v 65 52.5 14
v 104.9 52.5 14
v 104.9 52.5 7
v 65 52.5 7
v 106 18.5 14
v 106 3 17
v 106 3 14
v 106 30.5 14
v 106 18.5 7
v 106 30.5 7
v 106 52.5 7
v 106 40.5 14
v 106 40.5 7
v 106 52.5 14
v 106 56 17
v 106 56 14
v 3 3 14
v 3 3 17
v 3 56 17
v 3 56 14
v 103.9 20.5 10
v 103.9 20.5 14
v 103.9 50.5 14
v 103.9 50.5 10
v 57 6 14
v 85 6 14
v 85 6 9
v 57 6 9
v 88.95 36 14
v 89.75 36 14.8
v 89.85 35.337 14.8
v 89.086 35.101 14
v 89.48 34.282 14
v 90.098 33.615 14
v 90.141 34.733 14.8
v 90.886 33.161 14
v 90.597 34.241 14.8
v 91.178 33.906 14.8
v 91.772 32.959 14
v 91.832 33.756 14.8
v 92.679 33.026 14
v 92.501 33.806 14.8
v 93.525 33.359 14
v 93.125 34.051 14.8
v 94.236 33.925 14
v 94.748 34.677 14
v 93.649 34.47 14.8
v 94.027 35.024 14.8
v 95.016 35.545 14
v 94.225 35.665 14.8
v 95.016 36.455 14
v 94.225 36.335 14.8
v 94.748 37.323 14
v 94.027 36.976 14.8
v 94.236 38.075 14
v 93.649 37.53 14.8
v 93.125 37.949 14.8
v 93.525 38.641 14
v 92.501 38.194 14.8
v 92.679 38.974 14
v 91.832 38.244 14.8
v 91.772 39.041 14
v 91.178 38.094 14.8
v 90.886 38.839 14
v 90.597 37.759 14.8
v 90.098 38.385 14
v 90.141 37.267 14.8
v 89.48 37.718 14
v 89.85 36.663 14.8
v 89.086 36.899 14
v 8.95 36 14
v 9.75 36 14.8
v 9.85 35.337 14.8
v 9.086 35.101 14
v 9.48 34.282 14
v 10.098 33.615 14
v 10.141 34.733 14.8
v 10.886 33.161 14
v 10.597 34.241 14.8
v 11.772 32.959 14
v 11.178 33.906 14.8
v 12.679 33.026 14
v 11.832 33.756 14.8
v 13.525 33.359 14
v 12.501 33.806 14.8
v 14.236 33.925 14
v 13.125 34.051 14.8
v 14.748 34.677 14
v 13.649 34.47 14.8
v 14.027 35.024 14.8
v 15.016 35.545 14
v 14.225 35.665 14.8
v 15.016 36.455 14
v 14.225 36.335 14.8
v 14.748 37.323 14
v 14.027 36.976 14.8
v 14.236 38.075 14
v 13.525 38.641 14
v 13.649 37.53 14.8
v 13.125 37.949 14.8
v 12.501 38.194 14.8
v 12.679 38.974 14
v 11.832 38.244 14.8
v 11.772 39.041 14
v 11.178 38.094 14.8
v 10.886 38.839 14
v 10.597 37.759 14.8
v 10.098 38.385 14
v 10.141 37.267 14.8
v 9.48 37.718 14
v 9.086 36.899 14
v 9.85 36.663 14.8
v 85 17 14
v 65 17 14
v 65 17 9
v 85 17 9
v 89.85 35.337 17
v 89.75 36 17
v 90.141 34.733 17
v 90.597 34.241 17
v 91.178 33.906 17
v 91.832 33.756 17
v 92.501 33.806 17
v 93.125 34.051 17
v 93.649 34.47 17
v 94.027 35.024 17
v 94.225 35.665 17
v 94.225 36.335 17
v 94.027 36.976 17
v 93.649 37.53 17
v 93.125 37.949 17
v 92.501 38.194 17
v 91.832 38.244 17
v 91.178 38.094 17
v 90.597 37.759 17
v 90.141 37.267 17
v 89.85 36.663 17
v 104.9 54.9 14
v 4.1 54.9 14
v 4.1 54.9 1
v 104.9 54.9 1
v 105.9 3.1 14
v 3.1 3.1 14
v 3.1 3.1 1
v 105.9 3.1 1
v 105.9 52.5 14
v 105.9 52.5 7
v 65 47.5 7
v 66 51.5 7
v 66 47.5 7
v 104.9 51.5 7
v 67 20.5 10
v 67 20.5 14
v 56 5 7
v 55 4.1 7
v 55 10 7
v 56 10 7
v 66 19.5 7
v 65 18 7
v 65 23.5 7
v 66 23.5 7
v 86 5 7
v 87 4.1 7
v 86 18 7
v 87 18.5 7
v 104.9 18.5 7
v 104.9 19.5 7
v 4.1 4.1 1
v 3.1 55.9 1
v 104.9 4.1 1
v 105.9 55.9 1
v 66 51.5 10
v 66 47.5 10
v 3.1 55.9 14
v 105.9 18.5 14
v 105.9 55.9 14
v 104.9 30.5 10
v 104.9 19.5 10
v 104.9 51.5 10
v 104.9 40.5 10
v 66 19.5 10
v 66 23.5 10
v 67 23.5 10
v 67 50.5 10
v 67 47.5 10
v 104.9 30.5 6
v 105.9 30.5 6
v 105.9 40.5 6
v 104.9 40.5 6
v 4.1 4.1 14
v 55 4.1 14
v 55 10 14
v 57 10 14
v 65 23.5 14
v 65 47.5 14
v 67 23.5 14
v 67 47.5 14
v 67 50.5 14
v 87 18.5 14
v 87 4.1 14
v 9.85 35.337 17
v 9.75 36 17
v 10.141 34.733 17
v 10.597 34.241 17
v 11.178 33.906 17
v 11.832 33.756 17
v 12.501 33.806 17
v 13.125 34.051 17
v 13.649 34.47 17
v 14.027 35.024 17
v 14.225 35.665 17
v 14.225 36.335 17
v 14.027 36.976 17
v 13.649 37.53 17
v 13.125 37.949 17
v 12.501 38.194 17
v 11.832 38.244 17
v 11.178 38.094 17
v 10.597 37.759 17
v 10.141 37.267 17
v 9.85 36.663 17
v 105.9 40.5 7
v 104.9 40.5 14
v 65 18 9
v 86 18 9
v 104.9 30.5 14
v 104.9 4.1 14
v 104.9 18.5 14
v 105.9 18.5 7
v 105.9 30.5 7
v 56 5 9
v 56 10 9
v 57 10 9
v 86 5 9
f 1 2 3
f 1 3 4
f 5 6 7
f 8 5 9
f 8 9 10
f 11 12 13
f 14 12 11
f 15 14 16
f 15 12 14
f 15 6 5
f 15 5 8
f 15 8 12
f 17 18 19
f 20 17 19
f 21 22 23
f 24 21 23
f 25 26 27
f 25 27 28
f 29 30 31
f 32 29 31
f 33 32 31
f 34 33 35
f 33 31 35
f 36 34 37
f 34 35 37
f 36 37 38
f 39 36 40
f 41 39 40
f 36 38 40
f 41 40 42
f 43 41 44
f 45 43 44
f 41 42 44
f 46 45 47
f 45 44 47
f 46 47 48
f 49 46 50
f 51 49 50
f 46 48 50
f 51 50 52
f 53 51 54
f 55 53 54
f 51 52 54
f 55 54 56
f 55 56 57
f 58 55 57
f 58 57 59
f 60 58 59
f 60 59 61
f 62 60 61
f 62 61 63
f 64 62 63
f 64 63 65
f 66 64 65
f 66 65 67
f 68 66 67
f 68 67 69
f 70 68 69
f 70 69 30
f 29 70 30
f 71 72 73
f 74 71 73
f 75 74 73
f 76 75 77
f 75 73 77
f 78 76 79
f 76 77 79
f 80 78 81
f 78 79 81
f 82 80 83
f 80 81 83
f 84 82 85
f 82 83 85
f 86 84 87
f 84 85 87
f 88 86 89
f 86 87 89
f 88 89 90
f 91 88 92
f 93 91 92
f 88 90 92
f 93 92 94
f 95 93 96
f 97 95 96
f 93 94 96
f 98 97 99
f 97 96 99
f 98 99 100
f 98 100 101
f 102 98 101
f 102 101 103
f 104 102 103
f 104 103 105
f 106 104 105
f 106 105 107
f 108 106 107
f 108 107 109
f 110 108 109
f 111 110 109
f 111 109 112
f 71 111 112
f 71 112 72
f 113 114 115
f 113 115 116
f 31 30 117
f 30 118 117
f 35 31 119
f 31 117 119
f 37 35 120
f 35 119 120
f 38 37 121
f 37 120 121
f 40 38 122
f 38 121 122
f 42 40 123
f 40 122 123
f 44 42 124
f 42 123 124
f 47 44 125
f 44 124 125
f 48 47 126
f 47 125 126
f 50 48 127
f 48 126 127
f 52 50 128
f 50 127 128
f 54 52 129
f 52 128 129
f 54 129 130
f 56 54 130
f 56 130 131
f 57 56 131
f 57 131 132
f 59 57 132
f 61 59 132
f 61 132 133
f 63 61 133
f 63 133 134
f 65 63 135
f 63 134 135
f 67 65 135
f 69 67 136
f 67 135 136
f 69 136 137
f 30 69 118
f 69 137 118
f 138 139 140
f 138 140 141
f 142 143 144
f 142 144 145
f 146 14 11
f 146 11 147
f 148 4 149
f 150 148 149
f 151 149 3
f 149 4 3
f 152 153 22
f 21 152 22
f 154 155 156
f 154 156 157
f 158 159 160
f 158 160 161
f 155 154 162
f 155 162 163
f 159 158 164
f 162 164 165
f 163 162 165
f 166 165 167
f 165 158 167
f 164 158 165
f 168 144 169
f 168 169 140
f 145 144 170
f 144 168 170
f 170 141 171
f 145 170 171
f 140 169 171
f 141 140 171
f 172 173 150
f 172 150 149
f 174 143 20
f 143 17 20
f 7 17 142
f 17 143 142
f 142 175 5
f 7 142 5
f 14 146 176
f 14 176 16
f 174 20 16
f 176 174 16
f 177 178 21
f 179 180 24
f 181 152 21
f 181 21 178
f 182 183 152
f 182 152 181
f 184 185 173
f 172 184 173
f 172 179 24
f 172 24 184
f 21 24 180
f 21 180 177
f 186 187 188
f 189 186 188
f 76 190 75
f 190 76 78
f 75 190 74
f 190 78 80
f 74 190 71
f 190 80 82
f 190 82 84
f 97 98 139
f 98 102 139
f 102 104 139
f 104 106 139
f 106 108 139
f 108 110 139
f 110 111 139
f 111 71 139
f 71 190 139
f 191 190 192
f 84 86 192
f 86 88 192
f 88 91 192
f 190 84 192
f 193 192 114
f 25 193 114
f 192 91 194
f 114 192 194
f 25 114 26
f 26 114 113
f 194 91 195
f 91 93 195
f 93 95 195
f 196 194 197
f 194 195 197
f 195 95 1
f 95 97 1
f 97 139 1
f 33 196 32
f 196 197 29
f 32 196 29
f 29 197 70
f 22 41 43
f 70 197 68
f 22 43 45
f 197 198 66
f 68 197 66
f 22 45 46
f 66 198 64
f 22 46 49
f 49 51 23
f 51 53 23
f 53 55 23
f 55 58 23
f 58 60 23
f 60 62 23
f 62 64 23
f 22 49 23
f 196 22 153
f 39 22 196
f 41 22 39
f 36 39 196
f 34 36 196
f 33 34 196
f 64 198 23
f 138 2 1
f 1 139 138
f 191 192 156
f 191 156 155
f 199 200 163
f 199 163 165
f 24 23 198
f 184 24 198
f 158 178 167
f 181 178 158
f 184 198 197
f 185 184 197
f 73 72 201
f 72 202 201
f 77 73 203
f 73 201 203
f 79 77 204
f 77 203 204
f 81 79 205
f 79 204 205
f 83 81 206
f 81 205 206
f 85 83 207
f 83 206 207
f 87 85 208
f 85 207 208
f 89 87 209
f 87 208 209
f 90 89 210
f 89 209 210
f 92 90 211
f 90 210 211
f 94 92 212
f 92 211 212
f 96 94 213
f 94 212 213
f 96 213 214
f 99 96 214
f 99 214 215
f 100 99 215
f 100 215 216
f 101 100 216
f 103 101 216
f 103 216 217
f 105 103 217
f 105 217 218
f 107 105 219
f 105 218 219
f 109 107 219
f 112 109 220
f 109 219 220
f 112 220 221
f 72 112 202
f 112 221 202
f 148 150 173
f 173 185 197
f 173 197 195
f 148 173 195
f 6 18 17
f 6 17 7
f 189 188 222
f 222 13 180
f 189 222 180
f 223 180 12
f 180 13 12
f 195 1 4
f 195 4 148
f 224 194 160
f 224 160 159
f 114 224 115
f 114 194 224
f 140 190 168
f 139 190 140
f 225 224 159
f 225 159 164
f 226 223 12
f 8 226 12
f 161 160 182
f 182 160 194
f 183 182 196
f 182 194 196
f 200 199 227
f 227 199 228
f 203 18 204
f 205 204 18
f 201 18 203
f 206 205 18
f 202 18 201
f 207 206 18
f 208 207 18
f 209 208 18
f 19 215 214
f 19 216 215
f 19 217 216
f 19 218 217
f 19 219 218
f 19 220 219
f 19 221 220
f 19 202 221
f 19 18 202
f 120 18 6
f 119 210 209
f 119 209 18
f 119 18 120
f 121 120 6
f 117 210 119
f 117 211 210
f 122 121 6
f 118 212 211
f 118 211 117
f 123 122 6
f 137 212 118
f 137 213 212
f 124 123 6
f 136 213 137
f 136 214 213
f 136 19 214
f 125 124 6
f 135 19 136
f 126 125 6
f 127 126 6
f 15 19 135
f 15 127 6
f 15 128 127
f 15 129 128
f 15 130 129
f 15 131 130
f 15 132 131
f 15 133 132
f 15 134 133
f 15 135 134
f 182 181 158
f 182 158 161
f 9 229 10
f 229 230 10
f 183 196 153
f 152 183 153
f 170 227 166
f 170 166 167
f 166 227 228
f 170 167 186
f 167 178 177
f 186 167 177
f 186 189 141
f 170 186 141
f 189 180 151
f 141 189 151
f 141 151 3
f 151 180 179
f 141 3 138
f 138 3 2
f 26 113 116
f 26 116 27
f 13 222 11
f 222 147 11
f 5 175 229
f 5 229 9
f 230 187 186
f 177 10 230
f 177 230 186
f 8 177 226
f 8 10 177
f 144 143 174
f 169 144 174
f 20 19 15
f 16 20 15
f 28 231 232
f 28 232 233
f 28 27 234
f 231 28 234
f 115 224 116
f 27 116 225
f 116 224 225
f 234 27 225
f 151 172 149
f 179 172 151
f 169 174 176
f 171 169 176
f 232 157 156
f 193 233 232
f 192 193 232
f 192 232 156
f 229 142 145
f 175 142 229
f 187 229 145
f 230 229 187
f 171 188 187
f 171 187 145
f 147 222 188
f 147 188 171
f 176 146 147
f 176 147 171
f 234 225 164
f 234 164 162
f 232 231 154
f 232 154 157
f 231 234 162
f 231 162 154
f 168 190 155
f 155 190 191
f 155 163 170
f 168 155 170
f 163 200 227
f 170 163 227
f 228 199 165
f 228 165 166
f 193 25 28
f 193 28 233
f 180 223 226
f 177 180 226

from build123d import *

# Parameters (mm, degrees)
SKETCH022_W         = 103
SKETCH022_H         = 53
PAD014_DEPTH        = 3
HOLE002_D           = 4.5
HOLE002_DEPTH       = 25
HOLE002_CSINK_D     = 6.1
HOLE002_CSINK_ANGLE = 90
PAD015_DEPTH        = 7
SKETCH025_W         = 102.8
SKETCH025_H         = 52.8
SKETCH025_W_2       = 100.8
SKETCH025_H_2       = 50.8
PAD016_DEPTH        = 13
PAD017_DEPTH        = 7
SKETCH026_W         = 10
SKETCH026_H         = 8
POCKET003_DEPTH     = 5
PAD027_DEPTH        = 5
PAD028_DEPTH        = 4


with BuildPart() as part:
    # Sketch022 → Pad014 (new body)
    with BuildSketch(Plane.XY):
        with Locations((51.5, 26.5)):
            Rectangle(SKETCH022_W, SKETCH022_H)
    extrude(amount=-PAD014_DEPTH)

    # Hole002
    with Locations(Plane(origin=(0, 0, -3), x_dir=(1, 0, 0), z_dir=(0, 0, -1))):
        with Locations((9, -33), (89, -33)):
            CounterSinkHole(HOLE002_D / 2, HOLE002_CSINK_D / 2, depth=HOLE002_DEPTH, counter_sink_angle=HOLE002_CSINK_ANGLE)

    # Sketch024 → Pad015 (join)
    with BuildSketch(Plane.XY.offset(-3)):
        Polygon((103, 49.5), (62, 49.5), (62, 44.5), (63, 44.5), (63, 48.5), (102, 48.5), (102, 16.5), (63, 16.5), (63, 20.5), (62, 20.5), (62, 15.5), (103, 15.5), align=None)
    extrude(amount=-PAD015_DEPTH)

    # Sketch025 → Pad016 (join)
    with BuildSketch(Plane.XY.offset(-3)):
        with Locations((51.5, 26.5)):
            Rectangle(SKETCH025_W, SKETCH025_H)
        with Locations((51.5, 26.5)):
            Rectangle(SKETCH025_W_2, SKETCH025_H_2, mode=Mode.SUBTRACT)
    extrude(amount=-PAD016_DEPTH)

    # Sketch027 → Pad017 (join)
    with BuildSketch(Plane.XY.offset(-3)):
        Polygon((52, 1), (84, 1), (84, 16.5), (62, 16.5), (62, 15), (83, 15), (83, 2), (53, 2), (53, 7), (52, 7), align=None)
    extrude(amount=-PAD017_DEPTH)

    # Sketch026 (on Face7 of Pad017) → Pocket003 (cut)
    with BuildSketch(Plane.YZ.offset(103)):
        with Locations((32.5, -7)):
            Rectangle(SKETCH026_W, SKETCH026_H)
    extrude(amount=-POCKET003_DEPTH, mode=Mode.SUBTRACT)

    # Sketch040 → Pad027 (join)
    with BuildSketch(Plane.XY.offset(-3)):
        Polygon((53, 7), (53, 2), (83, 2), (83, 15), (62, 15), (62, 14), (82, 14), (82, 3), (54, 3), (54, 7), align=None)
    extrude(amount=-PAD027_DEPTH)

    # Sketch041 → Pad028 (join)
    with BuildSketch(Plane.XY.offset(-3)):
        Polygon((63, 44.5), (63, 48.5), (101.9, 48.5), (101.9, 16.5), (63, 16.5), (63, 20.5), (64, 20.5), (64, 17.5), (100.9, 17.5), (100.9, 47.5), (64, 47.5), (64, 44.5), align=None)
    extrude(amount=-PAD028_DEPTH)


with BuildPart() as part_1:
    # Body009 placement: moved
    add(part.part.moved(Location((3, 3, 17))))


solid = part_1.part
